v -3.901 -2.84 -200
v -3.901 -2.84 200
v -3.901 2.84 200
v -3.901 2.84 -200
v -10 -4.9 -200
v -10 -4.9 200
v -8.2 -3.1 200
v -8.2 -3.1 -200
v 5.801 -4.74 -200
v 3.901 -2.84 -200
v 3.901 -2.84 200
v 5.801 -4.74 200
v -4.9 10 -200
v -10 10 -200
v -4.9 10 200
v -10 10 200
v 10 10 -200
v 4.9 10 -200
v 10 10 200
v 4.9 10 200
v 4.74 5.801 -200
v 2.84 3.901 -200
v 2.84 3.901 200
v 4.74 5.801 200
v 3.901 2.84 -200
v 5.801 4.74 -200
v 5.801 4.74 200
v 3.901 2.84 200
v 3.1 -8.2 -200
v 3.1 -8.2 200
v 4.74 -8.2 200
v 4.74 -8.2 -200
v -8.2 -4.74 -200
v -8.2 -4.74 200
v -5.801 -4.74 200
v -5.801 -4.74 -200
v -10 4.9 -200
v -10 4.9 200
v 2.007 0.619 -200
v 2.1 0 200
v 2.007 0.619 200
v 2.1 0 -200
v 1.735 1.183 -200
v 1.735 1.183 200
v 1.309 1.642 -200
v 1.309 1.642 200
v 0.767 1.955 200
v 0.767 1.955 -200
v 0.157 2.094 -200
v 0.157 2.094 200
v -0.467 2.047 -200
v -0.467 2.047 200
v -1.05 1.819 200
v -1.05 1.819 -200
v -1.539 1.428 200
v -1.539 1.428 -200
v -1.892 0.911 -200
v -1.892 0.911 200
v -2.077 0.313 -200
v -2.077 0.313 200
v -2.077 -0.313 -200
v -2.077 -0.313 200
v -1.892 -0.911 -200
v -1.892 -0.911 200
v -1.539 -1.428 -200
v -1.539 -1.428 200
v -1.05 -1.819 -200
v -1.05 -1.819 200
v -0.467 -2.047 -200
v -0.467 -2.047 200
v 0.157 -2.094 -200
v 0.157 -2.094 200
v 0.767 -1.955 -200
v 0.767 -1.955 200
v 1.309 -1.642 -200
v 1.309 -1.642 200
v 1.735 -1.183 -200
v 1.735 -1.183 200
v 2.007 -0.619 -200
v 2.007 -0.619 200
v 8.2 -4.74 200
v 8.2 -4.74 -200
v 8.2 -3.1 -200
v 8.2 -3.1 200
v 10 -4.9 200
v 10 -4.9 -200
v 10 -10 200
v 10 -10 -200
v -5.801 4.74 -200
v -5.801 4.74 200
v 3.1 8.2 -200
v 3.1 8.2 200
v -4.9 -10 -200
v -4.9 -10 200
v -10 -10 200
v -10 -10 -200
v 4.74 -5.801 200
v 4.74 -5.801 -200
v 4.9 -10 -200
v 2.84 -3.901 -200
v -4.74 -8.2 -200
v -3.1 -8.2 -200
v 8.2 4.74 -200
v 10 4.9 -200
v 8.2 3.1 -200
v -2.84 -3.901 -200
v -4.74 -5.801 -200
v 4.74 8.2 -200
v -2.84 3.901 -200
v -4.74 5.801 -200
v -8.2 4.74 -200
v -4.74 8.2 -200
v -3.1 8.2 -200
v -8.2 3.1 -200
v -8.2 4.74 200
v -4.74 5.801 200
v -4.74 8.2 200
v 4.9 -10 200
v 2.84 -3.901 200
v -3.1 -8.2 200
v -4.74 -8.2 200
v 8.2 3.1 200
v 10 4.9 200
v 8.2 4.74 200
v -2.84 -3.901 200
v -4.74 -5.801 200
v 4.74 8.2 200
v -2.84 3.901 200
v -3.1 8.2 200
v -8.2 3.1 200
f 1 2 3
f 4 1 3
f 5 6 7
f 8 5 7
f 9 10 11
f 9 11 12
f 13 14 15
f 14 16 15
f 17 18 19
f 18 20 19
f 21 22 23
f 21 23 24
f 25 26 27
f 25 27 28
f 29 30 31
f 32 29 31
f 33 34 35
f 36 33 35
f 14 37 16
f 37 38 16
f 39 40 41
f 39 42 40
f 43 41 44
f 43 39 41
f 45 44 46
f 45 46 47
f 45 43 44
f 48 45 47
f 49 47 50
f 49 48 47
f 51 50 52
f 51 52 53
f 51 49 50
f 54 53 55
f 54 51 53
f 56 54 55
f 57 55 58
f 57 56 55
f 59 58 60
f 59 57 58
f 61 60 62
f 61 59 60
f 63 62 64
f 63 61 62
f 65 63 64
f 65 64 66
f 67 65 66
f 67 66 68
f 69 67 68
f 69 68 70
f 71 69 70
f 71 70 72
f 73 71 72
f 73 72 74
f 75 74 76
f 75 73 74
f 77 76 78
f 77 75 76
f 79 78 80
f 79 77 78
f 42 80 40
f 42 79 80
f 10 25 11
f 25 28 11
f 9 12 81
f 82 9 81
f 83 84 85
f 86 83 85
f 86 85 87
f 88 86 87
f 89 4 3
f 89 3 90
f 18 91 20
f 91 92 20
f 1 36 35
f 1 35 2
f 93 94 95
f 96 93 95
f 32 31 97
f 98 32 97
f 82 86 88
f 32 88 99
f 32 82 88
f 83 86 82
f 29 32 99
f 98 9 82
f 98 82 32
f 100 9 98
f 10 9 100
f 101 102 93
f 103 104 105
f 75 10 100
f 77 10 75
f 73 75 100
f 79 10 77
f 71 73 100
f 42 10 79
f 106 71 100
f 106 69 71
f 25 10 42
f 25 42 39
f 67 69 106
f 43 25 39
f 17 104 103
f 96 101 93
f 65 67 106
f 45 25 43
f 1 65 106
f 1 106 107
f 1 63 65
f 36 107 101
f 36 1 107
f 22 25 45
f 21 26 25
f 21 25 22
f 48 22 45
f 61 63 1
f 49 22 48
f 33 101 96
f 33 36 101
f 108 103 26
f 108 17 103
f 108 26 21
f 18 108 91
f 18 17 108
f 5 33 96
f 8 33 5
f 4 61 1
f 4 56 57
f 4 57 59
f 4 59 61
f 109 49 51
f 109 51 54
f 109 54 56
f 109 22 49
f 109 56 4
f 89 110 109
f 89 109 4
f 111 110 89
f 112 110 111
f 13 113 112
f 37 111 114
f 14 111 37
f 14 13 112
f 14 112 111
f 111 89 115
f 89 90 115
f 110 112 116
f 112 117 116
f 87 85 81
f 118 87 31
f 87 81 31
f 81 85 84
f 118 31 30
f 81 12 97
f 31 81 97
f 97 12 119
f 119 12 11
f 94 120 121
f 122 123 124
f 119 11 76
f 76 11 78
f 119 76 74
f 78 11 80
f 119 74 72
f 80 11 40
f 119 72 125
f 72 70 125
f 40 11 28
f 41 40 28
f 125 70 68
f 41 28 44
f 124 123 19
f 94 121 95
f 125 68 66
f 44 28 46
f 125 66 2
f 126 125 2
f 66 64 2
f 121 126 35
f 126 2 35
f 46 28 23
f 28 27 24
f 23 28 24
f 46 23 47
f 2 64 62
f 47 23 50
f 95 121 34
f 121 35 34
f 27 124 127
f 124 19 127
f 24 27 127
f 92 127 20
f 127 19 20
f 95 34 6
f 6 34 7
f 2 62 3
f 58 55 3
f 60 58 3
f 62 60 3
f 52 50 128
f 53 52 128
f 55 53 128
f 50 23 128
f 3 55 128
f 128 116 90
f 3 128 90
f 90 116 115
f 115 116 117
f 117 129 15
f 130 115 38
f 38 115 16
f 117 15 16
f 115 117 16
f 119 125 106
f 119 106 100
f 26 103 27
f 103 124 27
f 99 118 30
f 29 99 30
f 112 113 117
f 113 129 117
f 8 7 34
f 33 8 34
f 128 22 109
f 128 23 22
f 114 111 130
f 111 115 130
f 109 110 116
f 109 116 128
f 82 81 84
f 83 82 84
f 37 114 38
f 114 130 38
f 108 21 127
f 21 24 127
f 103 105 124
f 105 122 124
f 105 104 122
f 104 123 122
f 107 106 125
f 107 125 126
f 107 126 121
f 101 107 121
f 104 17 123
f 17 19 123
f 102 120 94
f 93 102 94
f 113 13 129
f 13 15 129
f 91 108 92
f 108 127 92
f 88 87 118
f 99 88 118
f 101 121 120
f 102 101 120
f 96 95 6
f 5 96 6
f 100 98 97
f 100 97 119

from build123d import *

# Parameters (mm, degrees)
SKETCH1_R           = 2.1
BOSS_EXTRUDE1_DEPTH = 200


with BuildPart() as part:
    # Sketch1 → Boss-Extrude1 (new, symmetric)
    with BuildSketch(Plane.XY):
        Polygon((-3.900660172, -2.84), (-3.900660172, 2.84), (-5.800660172, 4.74), (-8.2, 4.74), (-8.2, 3.1), (-10, 4.9), (-10, 10), (-4.9, 10), (-3.1, 8.2), (-4.74, 8.2), (-4.74, 5.800660172), (-2.84, 3.900660172), (0, 3.900660172), (2.84, 3.900660172), (4.74, 5.800660172), (4.74, 8.2), (3.1, 8.2), (4.9, 10), (10, 10), (10, 4.9), (8.2, 3.1), (8.2, 4.74), (5.800660172, 4.74), (3.900660172, 2.84), (3.900660172, -2.84), (5.800660172, -4.74), (8.2, -4.74), (8.2, -3.1), (10, -4.9), (10, -10), (4.9, -10), (3.1, -8.2), (4.74, -8.2), (4.74, -5.800660172), (2.84, -3.900660172), (0, -3.900660172), (-2.84, -3.900660172), (-4.74, -5.800660172), (-4.74, -8.2), (-3.1, -8.2), (-4.9, -10), (-10, -10), (-10, -4.9), (-8.2, -3.1), (-8.2, -4.74), (-5.800660172, -4.74), align=None)
        Circle(SKETCH1_R, mode=Mode.SUBTRACT)
    extrude(amount=BOSS_EXTRUDE1_DEPTH, both=True)


solid = part.part
